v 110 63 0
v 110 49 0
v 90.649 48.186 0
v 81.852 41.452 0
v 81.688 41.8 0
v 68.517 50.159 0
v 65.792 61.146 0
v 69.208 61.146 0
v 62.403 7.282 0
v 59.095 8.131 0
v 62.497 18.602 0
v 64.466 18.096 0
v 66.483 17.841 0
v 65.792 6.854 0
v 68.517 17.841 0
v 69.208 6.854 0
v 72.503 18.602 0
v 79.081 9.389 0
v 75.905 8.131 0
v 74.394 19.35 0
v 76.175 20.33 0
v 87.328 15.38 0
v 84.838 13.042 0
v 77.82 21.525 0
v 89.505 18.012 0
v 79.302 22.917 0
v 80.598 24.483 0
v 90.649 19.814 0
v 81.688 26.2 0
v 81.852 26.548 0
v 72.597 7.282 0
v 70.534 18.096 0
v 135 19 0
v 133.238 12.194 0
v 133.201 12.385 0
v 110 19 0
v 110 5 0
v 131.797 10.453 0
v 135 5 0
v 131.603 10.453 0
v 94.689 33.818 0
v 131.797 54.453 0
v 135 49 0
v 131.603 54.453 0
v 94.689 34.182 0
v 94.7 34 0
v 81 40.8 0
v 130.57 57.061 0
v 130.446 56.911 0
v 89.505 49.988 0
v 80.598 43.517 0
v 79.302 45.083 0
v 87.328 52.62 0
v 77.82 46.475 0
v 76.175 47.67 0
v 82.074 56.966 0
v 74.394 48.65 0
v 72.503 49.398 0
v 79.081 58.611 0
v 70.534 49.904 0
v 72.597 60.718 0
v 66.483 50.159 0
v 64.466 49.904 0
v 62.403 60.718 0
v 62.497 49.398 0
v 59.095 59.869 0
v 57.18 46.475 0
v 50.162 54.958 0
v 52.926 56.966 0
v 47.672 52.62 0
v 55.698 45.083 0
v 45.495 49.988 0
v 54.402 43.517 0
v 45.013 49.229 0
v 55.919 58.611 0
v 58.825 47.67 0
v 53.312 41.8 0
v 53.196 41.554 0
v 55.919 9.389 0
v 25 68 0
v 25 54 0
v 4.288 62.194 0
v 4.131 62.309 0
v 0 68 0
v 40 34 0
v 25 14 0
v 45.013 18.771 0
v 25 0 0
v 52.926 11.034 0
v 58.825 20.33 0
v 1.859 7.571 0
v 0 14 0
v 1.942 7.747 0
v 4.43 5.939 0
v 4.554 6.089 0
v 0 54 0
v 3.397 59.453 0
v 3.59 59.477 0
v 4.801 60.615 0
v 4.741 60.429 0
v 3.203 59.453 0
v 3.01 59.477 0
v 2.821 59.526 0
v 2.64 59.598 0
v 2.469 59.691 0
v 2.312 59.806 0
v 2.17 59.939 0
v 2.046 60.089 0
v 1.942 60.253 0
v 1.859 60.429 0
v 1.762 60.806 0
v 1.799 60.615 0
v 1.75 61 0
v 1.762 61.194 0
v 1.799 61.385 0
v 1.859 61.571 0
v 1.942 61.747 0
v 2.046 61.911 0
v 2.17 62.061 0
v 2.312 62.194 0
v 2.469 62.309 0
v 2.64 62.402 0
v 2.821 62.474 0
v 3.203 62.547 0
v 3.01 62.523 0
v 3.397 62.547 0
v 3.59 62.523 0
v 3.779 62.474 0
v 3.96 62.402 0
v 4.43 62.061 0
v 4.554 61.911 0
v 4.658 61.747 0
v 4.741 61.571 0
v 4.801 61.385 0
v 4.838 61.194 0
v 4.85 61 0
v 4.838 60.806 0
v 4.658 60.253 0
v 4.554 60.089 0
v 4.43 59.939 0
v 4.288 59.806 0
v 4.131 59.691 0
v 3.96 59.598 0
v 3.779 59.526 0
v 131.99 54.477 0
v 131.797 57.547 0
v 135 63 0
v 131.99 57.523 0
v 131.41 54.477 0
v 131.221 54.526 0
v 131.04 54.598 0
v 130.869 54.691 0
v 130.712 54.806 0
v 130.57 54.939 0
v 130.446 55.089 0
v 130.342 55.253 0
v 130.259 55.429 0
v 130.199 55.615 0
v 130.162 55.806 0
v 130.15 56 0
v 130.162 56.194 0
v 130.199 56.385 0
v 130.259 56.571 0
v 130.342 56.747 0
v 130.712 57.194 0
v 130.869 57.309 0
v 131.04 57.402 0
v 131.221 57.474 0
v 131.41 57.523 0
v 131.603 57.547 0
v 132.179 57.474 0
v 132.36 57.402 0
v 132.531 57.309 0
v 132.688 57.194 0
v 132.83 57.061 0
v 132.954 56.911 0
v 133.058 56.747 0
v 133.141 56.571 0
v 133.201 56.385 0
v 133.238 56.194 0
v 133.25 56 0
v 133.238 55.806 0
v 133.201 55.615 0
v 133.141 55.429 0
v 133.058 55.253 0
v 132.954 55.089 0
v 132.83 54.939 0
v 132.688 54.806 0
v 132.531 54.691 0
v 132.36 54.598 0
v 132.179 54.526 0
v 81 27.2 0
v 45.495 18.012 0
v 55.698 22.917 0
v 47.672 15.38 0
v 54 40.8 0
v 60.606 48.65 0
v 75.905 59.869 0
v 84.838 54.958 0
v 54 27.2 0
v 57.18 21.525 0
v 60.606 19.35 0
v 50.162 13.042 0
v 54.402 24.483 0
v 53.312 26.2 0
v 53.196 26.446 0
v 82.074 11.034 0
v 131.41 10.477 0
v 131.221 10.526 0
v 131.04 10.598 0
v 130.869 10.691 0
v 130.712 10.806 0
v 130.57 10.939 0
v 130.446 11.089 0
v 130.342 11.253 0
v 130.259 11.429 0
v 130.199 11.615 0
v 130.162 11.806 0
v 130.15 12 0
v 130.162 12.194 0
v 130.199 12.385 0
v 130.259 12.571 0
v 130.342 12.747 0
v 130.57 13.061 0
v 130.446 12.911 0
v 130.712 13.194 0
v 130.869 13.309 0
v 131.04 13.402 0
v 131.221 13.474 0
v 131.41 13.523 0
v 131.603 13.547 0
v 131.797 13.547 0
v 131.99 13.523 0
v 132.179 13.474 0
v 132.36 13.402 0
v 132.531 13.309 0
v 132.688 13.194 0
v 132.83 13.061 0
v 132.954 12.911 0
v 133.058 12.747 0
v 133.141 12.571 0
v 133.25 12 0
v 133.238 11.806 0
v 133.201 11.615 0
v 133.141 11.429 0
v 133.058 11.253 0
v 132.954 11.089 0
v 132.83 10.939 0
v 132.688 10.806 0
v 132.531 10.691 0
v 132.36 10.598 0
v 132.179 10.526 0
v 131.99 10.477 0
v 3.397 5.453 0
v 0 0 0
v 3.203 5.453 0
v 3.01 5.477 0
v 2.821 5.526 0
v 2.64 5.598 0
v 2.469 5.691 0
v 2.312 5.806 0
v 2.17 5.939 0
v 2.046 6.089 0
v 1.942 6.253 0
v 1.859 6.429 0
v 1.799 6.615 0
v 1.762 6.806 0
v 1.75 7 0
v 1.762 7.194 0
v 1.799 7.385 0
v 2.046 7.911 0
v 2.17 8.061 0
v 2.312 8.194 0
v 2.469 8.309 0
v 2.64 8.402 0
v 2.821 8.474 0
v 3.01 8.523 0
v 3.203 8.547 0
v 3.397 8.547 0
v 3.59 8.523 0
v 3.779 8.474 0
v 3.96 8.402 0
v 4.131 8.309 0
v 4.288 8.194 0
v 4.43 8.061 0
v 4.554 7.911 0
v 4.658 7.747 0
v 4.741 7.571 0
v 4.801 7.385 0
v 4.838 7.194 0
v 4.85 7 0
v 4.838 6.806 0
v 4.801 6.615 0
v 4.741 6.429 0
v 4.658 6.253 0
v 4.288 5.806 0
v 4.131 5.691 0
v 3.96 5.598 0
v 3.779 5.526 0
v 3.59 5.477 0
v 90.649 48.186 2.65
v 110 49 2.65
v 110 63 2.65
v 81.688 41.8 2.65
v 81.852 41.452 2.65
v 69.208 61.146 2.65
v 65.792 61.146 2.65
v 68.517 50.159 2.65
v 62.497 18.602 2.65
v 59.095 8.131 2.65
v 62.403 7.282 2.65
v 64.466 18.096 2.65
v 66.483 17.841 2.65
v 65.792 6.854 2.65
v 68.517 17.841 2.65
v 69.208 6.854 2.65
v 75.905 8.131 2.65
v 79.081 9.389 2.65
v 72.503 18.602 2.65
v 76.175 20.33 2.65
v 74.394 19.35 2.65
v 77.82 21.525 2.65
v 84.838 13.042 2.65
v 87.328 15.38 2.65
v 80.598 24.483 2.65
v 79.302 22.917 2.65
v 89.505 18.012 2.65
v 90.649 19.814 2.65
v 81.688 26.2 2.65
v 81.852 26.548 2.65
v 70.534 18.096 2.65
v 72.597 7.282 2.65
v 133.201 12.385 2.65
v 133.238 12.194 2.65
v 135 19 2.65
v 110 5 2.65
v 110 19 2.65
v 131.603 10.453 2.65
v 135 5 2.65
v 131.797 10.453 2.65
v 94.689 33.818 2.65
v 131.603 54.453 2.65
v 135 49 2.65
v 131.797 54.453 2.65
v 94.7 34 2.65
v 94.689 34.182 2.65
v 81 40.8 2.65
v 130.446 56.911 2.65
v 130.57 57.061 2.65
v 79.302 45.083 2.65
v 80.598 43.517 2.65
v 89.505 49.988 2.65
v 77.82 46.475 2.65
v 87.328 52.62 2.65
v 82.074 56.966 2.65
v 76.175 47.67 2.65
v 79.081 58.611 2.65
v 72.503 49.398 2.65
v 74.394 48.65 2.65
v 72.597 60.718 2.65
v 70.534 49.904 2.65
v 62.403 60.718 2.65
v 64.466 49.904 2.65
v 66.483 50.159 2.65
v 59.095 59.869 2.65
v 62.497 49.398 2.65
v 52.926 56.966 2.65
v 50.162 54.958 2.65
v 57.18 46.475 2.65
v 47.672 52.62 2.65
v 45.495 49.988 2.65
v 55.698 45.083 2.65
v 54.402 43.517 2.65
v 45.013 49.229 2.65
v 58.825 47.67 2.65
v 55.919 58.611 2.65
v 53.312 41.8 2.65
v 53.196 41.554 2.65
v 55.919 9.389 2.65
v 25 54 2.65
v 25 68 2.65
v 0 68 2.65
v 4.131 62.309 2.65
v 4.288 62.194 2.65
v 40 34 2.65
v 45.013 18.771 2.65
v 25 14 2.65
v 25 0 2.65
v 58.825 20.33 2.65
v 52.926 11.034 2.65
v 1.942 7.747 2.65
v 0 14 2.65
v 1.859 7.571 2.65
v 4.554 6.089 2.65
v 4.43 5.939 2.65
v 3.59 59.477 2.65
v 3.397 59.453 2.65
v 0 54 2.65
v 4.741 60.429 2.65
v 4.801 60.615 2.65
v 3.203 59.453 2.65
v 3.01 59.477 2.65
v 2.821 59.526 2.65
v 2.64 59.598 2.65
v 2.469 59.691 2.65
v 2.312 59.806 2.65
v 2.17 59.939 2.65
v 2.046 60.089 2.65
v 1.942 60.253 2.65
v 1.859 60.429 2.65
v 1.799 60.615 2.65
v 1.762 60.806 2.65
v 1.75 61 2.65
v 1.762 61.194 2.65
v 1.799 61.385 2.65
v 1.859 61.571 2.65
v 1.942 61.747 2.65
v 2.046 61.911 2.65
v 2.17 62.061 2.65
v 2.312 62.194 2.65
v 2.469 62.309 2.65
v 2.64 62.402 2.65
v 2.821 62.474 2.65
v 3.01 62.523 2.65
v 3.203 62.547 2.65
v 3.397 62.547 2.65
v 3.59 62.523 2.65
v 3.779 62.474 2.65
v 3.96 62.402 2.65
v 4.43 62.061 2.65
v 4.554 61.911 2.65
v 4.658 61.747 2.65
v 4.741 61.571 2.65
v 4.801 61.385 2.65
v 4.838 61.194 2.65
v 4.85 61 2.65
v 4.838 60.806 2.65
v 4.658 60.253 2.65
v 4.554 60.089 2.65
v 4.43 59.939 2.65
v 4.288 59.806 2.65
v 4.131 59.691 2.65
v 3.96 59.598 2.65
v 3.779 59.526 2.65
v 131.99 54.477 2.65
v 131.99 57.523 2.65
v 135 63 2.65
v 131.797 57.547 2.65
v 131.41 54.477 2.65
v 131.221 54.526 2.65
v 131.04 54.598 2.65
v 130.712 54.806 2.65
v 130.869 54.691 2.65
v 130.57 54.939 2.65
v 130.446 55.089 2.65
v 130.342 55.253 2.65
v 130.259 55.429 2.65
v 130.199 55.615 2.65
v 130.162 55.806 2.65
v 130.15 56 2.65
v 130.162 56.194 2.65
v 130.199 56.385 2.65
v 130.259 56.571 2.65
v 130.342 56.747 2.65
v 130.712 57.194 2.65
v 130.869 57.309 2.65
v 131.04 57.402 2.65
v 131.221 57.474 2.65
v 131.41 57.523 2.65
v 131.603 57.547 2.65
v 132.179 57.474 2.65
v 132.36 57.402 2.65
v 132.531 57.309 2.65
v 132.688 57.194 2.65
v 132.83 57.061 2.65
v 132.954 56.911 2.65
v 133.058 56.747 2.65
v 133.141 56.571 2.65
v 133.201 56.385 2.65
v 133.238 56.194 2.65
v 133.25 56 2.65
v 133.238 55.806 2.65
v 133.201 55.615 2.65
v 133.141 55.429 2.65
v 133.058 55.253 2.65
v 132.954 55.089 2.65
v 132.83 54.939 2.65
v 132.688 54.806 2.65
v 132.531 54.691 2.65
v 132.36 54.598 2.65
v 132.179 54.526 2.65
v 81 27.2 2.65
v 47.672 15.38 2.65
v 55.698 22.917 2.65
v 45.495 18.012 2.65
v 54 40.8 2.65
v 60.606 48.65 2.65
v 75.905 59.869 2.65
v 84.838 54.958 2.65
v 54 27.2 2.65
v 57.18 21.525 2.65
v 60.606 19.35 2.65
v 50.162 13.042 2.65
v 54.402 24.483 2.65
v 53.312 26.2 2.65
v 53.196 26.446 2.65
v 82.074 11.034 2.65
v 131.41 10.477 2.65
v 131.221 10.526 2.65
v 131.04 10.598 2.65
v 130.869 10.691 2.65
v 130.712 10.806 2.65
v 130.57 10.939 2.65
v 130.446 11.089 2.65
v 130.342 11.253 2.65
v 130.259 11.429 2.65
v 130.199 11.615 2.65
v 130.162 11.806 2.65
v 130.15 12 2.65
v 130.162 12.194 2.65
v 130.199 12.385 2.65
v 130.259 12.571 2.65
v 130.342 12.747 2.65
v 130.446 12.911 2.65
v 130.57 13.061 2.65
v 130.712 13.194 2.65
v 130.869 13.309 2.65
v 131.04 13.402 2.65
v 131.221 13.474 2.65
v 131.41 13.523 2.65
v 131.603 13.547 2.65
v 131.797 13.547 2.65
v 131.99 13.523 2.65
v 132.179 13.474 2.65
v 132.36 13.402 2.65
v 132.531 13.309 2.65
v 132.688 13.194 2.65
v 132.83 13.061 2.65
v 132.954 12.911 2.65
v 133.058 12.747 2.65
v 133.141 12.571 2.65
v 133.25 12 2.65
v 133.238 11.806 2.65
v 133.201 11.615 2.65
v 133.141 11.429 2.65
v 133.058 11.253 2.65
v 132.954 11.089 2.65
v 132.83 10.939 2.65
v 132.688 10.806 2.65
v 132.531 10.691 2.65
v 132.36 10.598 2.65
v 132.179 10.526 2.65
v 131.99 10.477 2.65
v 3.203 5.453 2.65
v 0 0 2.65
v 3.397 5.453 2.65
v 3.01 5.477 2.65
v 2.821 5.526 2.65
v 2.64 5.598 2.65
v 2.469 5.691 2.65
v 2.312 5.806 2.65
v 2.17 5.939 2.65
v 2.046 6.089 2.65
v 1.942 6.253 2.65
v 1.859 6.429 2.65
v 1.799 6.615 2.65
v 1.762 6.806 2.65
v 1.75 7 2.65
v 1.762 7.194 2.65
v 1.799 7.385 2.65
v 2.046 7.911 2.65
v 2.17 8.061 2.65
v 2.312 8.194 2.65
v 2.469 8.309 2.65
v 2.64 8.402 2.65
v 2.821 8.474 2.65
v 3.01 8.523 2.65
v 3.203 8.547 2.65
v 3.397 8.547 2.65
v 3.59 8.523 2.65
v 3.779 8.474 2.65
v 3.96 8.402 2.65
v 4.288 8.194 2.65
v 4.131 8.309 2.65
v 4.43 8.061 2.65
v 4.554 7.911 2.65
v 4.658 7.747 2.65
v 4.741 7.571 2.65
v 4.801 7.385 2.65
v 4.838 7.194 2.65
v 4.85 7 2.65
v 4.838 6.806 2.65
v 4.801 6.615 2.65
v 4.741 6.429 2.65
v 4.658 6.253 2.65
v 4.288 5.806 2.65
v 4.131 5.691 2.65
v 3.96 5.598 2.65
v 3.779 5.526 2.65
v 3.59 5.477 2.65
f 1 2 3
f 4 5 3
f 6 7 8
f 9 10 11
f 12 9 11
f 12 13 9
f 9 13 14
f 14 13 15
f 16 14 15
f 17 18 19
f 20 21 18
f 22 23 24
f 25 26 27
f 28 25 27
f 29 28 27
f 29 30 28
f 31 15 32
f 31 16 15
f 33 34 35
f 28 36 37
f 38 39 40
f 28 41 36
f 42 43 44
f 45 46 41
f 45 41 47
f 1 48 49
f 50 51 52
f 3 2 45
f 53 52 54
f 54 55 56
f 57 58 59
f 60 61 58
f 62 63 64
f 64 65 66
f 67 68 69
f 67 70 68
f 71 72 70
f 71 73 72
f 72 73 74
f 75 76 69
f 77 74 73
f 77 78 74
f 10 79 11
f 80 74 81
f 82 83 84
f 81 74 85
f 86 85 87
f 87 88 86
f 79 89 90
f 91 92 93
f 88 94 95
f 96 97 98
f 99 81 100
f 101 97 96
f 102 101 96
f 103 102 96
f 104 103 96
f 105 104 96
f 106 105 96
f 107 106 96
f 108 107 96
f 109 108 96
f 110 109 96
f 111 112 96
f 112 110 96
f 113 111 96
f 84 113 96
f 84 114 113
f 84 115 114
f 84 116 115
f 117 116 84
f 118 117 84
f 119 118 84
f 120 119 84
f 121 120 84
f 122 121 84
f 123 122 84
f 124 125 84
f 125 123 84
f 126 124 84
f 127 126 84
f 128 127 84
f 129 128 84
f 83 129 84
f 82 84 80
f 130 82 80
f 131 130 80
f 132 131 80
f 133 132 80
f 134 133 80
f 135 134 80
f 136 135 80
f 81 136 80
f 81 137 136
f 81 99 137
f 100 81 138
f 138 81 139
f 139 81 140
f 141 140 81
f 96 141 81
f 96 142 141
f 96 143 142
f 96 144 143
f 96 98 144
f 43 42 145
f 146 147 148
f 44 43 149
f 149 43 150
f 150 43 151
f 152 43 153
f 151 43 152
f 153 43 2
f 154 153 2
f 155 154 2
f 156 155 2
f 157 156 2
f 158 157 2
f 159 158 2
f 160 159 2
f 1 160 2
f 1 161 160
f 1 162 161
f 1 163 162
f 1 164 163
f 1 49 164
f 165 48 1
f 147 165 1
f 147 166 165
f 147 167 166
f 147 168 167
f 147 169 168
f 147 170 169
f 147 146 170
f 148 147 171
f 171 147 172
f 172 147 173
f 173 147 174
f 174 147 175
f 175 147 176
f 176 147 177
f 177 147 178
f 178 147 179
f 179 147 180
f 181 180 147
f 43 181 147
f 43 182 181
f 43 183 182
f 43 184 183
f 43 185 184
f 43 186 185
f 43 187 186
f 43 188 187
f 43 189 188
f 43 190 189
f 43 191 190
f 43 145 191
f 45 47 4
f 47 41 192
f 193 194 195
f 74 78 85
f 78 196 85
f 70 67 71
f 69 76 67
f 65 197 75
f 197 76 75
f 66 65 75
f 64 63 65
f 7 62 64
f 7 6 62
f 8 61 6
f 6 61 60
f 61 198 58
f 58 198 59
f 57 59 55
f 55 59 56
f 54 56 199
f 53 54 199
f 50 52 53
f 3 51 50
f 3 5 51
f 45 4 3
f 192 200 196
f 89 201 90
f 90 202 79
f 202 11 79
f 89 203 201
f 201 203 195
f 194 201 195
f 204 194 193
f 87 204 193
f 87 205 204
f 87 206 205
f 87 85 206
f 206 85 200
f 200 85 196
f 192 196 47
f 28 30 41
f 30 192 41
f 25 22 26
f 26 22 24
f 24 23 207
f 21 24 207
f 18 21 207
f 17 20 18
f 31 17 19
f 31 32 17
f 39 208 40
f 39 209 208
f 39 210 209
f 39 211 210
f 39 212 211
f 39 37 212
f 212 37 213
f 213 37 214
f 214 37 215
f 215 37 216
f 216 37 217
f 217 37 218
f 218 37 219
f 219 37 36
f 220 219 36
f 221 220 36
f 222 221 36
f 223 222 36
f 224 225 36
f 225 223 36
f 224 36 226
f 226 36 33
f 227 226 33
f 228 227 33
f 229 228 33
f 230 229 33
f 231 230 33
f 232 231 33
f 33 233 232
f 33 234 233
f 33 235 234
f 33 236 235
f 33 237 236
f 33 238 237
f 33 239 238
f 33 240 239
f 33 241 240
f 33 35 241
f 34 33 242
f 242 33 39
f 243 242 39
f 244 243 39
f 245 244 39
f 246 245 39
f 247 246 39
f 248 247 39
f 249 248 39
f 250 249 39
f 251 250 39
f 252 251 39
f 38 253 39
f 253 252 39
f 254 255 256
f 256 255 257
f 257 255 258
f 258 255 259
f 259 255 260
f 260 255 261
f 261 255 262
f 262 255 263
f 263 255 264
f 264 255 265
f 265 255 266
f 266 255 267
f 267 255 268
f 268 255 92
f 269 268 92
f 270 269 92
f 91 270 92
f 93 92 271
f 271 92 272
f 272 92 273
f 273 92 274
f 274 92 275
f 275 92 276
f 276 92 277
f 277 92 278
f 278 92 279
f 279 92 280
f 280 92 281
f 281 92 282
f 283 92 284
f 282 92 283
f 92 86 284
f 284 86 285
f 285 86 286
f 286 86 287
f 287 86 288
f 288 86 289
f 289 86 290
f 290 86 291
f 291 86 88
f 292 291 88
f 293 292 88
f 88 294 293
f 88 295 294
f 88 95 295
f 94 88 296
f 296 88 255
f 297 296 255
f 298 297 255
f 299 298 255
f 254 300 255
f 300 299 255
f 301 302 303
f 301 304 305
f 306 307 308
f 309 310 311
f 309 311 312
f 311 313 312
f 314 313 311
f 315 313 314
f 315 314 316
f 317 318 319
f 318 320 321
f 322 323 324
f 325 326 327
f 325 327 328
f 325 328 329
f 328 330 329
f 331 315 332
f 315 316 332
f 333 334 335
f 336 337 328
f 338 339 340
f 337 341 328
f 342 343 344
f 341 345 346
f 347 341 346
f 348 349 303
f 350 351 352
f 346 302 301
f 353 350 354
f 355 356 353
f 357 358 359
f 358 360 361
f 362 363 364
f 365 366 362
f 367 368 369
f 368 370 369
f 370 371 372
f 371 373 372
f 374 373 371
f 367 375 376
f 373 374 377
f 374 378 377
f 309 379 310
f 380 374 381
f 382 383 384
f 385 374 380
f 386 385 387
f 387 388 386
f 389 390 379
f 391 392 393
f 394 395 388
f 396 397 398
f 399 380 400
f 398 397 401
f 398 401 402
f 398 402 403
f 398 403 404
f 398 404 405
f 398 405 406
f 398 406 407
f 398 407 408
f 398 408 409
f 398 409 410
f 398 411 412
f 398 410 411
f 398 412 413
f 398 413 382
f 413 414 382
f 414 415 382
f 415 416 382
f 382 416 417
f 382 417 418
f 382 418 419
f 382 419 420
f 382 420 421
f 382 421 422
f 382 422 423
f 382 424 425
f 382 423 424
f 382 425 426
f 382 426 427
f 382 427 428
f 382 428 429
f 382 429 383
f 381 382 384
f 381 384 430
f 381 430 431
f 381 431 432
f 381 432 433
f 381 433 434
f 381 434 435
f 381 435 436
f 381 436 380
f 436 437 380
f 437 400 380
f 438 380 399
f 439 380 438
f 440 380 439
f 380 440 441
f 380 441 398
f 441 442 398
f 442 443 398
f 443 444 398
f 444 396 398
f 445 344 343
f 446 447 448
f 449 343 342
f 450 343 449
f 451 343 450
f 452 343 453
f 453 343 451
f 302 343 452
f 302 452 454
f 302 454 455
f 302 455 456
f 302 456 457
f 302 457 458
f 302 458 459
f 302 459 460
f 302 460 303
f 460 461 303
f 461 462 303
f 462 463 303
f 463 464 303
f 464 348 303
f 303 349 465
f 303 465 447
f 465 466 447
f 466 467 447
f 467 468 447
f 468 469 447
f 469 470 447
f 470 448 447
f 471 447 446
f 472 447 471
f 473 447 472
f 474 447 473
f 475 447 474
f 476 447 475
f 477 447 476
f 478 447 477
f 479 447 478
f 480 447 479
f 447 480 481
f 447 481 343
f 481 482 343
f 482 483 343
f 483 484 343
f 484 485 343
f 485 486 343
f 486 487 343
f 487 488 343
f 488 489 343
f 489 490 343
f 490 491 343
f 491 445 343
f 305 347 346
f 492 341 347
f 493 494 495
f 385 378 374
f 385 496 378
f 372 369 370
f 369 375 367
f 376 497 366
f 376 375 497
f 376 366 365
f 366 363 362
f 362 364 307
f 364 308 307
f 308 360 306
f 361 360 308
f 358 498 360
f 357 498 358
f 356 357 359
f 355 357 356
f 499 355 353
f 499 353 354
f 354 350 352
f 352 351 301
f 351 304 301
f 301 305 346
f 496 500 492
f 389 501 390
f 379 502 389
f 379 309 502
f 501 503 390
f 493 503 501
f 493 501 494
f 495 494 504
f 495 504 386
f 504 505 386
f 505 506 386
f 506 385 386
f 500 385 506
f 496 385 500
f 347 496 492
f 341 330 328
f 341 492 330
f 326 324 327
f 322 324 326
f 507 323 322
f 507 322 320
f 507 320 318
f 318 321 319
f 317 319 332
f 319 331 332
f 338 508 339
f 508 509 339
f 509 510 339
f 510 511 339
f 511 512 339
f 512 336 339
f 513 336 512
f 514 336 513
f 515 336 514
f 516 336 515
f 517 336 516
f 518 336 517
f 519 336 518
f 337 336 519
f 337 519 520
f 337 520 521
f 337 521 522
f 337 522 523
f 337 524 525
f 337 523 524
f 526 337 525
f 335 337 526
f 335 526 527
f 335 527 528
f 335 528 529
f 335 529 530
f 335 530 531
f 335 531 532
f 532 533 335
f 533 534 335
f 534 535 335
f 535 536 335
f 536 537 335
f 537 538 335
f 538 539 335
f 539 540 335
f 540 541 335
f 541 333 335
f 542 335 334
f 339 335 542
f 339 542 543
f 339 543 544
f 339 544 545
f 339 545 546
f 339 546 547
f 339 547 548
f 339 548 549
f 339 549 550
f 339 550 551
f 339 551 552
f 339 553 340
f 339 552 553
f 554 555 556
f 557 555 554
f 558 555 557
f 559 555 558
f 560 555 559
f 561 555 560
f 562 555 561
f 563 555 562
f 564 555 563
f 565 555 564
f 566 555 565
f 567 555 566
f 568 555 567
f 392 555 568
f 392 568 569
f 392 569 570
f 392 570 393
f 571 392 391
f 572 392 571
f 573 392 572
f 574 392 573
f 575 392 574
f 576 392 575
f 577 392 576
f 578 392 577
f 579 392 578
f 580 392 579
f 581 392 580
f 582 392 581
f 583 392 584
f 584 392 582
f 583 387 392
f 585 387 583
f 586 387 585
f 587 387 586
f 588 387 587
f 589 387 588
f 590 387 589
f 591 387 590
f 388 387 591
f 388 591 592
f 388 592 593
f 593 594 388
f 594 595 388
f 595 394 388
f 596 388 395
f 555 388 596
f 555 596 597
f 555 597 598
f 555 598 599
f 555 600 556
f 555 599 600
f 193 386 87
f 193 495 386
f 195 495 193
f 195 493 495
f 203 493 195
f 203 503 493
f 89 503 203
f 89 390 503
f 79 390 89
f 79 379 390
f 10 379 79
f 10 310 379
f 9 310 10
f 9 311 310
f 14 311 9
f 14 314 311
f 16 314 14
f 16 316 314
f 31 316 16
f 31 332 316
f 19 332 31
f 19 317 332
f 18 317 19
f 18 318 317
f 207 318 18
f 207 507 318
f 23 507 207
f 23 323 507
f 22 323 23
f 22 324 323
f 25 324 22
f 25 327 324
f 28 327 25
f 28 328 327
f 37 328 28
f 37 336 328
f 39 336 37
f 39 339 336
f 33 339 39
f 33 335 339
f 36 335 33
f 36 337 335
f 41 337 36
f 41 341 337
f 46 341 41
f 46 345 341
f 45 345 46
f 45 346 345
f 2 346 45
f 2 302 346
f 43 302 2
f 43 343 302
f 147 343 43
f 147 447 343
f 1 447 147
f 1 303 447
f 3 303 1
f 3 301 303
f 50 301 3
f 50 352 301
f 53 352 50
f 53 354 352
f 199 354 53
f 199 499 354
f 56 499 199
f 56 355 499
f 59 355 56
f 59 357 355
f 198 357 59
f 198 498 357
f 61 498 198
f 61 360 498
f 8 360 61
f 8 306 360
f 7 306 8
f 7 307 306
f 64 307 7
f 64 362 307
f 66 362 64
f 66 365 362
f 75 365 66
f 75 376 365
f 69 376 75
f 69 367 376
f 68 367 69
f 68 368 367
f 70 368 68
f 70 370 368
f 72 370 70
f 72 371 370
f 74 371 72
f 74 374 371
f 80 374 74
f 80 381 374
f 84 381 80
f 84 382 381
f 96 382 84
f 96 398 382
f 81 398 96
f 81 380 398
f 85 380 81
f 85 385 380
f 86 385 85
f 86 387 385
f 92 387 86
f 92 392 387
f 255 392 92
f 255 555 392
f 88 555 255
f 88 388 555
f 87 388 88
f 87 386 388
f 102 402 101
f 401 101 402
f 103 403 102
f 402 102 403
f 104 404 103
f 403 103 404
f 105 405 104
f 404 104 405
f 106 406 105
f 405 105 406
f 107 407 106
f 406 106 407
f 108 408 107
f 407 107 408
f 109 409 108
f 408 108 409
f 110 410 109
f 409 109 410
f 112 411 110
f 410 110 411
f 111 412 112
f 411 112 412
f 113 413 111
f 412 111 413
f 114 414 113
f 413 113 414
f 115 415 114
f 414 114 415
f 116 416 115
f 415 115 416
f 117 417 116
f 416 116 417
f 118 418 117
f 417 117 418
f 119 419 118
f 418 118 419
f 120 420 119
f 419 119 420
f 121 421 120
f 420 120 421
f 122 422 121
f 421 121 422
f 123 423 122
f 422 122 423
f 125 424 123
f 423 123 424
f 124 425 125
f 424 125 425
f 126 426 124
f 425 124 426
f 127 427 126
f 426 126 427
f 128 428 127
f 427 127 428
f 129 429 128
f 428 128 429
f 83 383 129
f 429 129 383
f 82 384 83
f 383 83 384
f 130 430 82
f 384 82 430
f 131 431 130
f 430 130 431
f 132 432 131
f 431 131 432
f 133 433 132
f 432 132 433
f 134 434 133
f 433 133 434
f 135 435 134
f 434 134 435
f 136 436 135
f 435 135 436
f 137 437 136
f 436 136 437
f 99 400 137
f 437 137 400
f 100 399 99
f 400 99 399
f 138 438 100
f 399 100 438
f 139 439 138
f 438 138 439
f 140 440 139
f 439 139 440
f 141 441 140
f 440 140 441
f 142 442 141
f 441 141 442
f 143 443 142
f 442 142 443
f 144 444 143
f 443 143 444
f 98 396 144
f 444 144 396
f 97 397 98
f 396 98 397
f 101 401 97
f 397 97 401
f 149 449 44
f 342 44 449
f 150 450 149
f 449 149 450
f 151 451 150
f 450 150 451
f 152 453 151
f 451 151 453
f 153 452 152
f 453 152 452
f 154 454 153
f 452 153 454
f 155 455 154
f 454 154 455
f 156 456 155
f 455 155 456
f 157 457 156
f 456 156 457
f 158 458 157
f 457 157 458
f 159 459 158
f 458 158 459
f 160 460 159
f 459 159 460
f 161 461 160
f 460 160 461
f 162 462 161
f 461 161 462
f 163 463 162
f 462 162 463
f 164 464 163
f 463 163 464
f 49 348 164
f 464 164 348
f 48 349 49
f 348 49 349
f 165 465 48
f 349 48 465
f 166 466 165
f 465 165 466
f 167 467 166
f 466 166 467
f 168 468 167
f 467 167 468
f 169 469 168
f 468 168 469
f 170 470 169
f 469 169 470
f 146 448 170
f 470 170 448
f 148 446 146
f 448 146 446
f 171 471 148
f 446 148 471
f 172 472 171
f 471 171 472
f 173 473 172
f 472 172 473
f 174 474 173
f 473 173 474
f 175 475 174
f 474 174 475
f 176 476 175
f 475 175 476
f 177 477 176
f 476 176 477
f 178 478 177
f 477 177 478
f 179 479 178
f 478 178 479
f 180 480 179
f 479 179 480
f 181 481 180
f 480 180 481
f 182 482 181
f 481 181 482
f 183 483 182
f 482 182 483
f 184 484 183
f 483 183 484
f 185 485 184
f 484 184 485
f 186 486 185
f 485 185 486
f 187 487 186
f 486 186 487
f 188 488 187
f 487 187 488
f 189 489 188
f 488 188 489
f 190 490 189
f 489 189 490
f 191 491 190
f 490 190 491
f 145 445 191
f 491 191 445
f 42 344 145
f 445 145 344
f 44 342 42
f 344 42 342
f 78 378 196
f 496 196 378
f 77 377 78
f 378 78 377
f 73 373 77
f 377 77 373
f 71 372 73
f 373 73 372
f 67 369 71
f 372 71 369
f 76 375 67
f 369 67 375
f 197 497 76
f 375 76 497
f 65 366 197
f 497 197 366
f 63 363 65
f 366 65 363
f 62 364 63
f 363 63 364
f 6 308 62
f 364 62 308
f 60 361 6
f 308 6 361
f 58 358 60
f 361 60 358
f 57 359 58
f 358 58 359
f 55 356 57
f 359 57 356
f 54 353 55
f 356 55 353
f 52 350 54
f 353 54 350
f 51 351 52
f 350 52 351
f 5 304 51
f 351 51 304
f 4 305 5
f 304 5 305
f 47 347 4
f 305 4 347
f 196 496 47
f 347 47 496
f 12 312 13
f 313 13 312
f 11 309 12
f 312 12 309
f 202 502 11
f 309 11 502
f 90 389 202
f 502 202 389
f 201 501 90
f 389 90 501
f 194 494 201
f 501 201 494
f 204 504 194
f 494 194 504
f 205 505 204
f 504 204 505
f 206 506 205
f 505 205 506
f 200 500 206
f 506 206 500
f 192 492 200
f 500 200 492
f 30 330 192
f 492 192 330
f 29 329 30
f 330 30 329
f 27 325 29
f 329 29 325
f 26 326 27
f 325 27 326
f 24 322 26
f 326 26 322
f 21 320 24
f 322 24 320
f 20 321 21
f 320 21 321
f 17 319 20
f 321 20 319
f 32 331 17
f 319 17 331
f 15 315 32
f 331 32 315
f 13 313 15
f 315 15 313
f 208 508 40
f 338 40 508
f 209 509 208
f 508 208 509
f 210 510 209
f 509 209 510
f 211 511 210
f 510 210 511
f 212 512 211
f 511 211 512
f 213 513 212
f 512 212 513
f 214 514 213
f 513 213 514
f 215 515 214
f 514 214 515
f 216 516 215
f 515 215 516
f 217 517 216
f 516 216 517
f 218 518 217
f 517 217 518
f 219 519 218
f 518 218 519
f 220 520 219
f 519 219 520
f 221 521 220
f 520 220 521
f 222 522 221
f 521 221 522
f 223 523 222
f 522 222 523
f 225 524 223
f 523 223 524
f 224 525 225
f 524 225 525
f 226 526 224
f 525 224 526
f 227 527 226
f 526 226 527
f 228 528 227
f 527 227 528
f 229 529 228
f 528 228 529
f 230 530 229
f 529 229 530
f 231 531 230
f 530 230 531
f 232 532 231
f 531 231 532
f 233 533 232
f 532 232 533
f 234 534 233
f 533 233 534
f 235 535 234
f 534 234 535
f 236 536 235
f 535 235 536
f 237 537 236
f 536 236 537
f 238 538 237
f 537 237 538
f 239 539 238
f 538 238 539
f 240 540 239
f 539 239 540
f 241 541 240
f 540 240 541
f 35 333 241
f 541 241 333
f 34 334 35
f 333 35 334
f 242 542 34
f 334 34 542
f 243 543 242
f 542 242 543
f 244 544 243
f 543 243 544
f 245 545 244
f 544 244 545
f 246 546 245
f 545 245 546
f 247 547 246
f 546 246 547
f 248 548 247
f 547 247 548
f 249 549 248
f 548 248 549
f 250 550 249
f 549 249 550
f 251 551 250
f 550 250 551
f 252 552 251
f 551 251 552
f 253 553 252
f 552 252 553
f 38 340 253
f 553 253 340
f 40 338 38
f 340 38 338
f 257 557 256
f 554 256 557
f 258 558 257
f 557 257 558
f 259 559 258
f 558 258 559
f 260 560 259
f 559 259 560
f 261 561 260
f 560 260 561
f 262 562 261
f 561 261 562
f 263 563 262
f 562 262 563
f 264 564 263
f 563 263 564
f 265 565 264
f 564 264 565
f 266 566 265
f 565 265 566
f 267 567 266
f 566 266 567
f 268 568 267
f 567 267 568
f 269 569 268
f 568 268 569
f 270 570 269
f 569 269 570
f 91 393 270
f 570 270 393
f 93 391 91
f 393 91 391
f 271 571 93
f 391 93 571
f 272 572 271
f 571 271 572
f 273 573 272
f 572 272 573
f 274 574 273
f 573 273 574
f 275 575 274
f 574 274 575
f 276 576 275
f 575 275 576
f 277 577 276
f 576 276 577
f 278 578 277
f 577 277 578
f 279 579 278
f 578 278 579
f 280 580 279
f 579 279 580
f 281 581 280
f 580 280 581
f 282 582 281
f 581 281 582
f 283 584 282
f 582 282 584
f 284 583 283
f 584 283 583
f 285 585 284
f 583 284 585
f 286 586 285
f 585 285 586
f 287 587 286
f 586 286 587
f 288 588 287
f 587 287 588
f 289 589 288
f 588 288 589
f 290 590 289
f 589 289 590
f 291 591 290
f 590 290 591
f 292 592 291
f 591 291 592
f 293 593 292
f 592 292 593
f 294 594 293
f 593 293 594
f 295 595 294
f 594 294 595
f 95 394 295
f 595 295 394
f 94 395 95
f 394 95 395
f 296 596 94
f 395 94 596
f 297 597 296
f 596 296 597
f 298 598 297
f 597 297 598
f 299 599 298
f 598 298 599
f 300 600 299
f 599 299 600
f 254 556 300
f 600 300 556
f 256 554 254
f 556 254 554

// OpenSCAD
/*

 Sidewalls for ethoscope

 See: https://gilestrolab.github.io/ethoscope/

 The available parts were too thick when printed on our lulzbot taz printer, hence this redesign.

 Mark Stenglein, 3.6.2020 

*/


// this variable controls the resolution of the model (the number of fragments)
// decrease for coarser
$fn=50;

tab_width=14;
tab_height=2.65;
small_side_space = 30;
large_side_space = 40;
short_side_offset = (large_side_space - small_side_space)/2;
part_length = 135;
part_width = tab_width + tab_width + large_side_space;


// these points define a polygon of the cross-section of the gel tray
// this will be linear extruded...
cross_section_points = [ 
[0,0], 
[0, tab_width],
[25, tab_width],
[40, part_width/2],
[25, part_width-tab_width],
[0, part_width-tab_width],
[0, part_width],
[25, part_width],
[(part_length*0.4), (part_width*0.6)],
[(part_length*0.6), (part_width*0.6)],
[(part_length-25), part_width-short_side_offset],
[part_length, part_width-short_side_offset],
[part_length, part_width-short_side_offset-tab_width],
[part_length-25, part_width-short_side_offset-tab_width],
[(part_length*0.7), (part_width/2)],
[(part_length-25), short_side_offset+tab_width],
[part_length, short_side_offset+tab_width],
[part_length, short_side_offset],
[part_length-25, short_side_offset],
[(part_length*0.6), (part_width*0.4)],
[(part_length*0.4), (part_width*0.4)],
[25,0],
[0,0]];


circle_diameter = 3.1;
circle_offset = 1.75 + (circle_diameter/2); 

part();


module part()
{
   // this linear extrude will make the body of the gel tray
   linear_extrude(height=tab_height)
   {
      // subtract little holes
      difference()
      {
         union()
         {
            // this polygon defines the tray's x-section
            polygon(cross_section_points);
            // a circle in the middle
            difference()
            {
               translate([part_length/2, part_width/2,0])
               circle(r=part_width/2.5);
               translate([part_length/2, part_width/2,0])
               circle(r=part_width/4.2);
            }
         }

         // 4 little holes
         translate([circle_offset, tab_width/2, 0])
         circle(d = circle_diameter);
         translate([circle_offset, tab_width + large_side_space + tab_width/2, 0])
         circle(d = circle_diameter);
         translate([part_length-circle_offset, short_side_offset + tab_width/2, 0])
         circle(d = circle_diameter);
         translate([part_length-circle_offset, short_side_offset + tab_width + small_side_space + tab_width/2, 0])
         circle(d = circle_diameter);
      }
   } 
   
}
